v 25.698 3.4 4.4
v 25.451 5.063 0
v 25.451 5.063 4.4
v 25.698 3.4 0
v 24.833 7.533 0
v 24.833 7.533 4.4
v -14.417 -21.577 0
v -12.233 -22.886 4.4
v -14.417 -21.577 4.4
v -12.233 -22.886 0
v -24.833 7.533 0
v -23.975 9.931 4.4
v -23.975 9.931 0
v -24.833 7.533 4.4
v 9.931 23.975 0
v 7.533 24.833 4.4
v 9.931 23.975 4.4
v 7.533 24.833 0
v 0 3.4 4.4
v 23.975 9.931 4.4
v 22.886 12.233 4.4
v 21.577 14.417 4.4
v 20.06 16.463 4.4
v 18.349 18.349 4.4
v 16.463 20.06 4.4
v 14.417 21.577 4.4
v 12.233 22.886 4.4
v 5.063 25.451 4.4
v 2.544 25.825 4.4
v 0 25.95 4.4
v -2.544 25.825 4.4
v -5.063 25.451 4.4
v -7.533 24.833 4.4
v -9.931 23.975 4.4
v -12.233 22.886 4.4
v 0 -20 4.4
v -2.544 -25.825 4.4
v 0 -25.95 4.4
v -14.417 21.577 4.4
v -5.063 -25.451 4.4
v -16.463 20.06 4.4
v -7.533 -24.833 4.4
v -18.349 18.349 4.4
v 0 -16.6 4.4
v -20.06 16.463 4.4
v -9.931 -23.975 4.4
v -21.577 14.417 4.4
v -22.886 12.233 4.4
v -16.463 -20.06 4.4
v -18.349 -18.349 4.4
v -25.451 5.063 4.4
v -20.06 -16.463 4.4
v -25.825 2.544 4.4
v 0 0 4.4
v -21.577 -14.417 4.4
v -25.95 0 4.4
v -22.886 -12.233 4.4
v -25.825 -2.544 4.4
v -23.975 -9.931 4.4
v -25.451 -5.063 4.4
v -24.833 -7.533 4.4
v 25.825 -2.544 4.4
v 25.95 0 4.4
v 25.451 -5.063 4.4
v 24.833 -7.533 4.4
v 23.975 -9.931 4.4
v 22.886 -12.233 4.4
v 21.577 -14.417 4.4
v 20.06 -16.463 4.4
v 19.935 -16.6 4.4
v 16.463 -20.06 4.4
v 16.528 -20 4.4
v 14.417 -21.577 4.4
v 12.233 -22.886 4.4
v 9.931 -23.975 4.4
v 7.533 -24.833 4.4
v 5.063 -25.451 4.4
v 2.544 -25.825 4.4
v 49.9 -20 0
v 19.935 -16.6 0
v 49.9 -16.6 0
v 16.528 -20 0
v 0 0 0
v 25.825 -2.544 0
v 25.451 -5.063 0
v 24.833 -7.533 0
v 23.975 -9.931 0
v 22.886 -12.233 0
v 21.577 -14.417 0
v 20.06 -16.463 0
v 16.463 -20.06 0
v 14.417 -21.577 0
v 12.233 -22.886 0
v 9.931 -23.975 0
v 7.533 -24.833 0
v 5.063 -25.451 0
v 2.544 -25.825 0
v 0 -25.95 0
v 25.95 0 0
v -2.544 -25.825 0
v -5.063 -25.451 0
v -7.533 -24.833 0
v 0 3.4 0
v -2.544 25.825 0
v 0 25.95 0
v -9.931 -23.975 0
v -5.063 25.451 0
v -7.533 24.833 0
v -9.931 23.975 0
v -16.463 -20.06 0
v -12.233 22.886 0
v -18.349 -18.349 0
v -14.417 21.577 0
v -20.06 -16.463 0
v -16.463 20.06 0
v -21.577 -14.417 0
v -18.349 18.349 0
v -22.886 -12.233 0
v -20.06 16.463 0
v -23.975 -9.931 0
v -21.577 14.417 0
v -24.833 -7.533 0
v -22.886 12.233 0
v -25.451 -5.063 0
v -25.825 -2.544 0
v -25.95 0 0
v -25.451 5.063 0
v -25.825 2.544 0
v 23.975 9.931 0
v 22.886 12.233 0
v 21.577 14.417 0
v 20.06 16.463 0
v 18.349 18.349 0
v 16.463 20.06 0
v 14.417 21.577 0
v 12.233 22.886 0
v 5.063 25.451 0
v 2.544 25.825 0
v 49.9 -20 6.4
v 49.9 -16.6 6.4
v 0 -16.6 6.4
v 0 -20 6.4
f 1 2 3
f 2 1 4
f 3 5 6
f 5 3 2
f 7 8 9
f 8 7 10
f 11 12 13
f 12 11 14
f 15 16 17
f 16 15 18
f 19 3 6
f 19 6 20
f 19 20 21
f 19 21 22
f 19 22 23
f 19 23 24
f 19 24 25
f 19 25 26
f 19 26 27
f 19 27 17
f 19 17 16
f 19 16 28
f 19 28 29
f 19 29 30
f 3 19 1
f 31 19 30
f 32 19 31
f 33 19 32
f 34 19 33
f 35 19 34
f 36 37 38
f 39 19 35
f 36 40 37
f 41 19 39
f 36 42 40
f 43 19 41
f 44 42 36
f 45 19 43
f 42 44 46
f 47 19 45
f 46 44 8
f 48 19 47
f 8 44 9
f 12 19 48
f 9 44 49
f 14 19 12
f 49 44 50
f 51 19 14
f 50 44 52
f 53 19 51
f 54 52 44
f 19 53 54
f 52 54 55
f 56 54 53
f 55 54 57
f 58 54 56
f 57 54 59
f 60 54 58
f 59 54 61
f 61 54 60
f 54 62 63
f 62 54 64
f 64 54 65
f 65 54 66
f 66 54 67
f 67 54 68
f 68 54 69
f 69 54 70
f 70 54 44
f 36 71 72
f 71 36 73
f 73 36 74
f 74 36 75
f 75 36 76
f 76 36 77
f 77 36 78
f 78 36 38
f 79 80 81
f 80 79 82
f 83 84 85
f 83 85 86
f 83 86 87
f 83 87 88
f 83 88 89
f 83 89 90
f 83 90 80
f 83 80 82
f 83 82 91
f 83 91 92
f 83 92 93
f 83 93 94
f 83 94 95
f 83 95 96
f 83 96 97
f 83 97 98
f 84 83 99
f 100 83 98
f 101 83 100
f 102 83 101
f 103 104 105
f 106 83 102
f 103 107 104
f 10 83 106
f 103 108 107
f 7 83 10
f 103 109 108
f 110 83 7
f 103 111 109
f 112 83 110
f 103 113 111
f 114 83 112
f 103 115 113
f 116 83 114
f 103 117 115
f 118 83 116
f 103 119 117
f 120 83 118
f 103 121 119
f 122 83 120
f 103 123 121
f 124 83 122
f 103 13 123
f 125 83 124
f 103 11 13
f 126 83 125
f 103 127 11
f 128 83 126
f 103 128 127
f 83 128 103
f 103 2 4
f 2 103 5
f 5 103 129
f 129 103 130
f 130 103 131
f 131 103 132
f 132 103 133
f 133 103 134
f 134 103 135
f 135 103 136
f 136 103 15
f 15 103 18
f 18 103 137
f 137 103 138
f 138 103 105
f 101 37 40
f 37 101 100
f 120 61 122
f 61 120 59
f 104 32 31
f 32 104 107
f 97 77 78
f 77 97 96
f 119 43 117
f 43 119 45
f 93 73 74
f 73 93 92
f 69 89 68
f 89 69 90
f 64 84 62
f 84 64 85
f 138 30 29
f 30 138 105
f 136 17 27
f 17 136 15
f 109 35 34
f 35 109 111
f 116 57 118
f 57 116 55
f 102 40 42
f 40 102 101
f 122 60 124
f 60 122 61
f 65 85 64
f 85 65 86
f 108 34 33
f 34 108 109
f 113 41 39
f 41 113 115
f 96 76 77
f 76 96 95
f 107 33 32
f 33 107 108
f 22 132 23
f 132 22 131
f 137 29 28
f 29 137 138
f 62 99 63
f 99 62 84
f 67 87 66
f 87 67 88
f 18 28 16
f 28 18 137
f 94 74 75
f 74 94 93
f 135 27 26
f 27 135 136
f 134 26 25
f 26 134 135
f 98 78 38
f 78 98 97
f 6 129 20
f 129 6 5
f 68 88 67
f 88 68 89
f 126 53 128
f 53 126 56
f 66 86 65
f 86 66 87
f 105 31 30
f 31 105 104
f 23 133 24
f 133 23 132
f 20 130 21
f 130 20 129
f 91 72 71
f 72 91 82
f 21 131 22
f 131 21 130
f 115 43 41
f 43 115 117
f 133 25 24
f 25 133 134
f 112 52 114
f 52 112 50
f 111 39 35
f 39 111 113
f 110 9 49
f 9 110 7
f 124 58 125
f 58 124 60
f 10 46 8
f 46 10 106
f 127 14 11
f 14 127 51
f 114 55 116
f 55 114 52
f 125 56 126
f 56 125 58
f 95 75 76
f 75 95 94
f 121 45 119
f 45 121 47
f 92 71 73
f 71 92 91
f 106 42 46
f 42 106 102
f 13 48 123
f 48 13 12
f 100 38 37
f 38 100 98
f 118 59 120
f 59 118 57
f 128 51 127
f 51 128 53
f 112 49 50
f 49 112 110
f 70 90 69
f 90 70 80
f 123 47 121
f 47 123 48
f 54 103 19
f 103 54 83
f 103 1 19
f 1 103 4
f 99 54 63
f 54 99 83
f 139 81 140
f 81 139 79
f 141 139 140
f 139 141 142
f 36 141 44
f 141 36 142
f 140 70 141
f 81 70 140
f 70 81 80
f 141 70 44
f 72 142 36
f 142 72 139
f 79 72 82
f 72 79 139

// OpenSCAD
/* [General] */
innerDiameter = 17.5;

/* [Reflector] */
reflectorDiameter = 45.5;
reflectorThickness = 1.8;
reflectorWalls = 2;
reflectorCoverWalls = 1.2;
reflectorCoverBrim = 1;
rcbh = 0.6;

/* [Tolerances] */
reflectorCoverPadding = 0.20;
depth = 3;

/* [Hidden] */
$fn = 64;

reflectorRadius = reflectorDiameter / 2;
reflectorDiameterOuter = reflectorDiameter + (reflectorWalls * 2);

reflectorCoverHeight = reflectorWalls + reflectorThickness + rcbh;
reflectorCoverDepth = depth + reflectorCoverPadding * 2;

width =  reflectorDiameterOuter + reflectorCoverPadding * 2;

coverWidth = reflectorDiameter + (reflectorWalls + reflectorCoverWalls) * 2;
coverRadius = coverWidth / 2;

difference() {
    cylinder(r = coverRadius, h = reflectorCoverHeight);
    
    translate([0, 0, -1]) {
        #cube([width, reflectorCoverDepth, reflectorCoverHeight + 2]);
    }
    
}

translate([0, -20, 0]) {
    cube([width, reflectorCoverDepth, reflectorCoverHeight + 2]);
}
